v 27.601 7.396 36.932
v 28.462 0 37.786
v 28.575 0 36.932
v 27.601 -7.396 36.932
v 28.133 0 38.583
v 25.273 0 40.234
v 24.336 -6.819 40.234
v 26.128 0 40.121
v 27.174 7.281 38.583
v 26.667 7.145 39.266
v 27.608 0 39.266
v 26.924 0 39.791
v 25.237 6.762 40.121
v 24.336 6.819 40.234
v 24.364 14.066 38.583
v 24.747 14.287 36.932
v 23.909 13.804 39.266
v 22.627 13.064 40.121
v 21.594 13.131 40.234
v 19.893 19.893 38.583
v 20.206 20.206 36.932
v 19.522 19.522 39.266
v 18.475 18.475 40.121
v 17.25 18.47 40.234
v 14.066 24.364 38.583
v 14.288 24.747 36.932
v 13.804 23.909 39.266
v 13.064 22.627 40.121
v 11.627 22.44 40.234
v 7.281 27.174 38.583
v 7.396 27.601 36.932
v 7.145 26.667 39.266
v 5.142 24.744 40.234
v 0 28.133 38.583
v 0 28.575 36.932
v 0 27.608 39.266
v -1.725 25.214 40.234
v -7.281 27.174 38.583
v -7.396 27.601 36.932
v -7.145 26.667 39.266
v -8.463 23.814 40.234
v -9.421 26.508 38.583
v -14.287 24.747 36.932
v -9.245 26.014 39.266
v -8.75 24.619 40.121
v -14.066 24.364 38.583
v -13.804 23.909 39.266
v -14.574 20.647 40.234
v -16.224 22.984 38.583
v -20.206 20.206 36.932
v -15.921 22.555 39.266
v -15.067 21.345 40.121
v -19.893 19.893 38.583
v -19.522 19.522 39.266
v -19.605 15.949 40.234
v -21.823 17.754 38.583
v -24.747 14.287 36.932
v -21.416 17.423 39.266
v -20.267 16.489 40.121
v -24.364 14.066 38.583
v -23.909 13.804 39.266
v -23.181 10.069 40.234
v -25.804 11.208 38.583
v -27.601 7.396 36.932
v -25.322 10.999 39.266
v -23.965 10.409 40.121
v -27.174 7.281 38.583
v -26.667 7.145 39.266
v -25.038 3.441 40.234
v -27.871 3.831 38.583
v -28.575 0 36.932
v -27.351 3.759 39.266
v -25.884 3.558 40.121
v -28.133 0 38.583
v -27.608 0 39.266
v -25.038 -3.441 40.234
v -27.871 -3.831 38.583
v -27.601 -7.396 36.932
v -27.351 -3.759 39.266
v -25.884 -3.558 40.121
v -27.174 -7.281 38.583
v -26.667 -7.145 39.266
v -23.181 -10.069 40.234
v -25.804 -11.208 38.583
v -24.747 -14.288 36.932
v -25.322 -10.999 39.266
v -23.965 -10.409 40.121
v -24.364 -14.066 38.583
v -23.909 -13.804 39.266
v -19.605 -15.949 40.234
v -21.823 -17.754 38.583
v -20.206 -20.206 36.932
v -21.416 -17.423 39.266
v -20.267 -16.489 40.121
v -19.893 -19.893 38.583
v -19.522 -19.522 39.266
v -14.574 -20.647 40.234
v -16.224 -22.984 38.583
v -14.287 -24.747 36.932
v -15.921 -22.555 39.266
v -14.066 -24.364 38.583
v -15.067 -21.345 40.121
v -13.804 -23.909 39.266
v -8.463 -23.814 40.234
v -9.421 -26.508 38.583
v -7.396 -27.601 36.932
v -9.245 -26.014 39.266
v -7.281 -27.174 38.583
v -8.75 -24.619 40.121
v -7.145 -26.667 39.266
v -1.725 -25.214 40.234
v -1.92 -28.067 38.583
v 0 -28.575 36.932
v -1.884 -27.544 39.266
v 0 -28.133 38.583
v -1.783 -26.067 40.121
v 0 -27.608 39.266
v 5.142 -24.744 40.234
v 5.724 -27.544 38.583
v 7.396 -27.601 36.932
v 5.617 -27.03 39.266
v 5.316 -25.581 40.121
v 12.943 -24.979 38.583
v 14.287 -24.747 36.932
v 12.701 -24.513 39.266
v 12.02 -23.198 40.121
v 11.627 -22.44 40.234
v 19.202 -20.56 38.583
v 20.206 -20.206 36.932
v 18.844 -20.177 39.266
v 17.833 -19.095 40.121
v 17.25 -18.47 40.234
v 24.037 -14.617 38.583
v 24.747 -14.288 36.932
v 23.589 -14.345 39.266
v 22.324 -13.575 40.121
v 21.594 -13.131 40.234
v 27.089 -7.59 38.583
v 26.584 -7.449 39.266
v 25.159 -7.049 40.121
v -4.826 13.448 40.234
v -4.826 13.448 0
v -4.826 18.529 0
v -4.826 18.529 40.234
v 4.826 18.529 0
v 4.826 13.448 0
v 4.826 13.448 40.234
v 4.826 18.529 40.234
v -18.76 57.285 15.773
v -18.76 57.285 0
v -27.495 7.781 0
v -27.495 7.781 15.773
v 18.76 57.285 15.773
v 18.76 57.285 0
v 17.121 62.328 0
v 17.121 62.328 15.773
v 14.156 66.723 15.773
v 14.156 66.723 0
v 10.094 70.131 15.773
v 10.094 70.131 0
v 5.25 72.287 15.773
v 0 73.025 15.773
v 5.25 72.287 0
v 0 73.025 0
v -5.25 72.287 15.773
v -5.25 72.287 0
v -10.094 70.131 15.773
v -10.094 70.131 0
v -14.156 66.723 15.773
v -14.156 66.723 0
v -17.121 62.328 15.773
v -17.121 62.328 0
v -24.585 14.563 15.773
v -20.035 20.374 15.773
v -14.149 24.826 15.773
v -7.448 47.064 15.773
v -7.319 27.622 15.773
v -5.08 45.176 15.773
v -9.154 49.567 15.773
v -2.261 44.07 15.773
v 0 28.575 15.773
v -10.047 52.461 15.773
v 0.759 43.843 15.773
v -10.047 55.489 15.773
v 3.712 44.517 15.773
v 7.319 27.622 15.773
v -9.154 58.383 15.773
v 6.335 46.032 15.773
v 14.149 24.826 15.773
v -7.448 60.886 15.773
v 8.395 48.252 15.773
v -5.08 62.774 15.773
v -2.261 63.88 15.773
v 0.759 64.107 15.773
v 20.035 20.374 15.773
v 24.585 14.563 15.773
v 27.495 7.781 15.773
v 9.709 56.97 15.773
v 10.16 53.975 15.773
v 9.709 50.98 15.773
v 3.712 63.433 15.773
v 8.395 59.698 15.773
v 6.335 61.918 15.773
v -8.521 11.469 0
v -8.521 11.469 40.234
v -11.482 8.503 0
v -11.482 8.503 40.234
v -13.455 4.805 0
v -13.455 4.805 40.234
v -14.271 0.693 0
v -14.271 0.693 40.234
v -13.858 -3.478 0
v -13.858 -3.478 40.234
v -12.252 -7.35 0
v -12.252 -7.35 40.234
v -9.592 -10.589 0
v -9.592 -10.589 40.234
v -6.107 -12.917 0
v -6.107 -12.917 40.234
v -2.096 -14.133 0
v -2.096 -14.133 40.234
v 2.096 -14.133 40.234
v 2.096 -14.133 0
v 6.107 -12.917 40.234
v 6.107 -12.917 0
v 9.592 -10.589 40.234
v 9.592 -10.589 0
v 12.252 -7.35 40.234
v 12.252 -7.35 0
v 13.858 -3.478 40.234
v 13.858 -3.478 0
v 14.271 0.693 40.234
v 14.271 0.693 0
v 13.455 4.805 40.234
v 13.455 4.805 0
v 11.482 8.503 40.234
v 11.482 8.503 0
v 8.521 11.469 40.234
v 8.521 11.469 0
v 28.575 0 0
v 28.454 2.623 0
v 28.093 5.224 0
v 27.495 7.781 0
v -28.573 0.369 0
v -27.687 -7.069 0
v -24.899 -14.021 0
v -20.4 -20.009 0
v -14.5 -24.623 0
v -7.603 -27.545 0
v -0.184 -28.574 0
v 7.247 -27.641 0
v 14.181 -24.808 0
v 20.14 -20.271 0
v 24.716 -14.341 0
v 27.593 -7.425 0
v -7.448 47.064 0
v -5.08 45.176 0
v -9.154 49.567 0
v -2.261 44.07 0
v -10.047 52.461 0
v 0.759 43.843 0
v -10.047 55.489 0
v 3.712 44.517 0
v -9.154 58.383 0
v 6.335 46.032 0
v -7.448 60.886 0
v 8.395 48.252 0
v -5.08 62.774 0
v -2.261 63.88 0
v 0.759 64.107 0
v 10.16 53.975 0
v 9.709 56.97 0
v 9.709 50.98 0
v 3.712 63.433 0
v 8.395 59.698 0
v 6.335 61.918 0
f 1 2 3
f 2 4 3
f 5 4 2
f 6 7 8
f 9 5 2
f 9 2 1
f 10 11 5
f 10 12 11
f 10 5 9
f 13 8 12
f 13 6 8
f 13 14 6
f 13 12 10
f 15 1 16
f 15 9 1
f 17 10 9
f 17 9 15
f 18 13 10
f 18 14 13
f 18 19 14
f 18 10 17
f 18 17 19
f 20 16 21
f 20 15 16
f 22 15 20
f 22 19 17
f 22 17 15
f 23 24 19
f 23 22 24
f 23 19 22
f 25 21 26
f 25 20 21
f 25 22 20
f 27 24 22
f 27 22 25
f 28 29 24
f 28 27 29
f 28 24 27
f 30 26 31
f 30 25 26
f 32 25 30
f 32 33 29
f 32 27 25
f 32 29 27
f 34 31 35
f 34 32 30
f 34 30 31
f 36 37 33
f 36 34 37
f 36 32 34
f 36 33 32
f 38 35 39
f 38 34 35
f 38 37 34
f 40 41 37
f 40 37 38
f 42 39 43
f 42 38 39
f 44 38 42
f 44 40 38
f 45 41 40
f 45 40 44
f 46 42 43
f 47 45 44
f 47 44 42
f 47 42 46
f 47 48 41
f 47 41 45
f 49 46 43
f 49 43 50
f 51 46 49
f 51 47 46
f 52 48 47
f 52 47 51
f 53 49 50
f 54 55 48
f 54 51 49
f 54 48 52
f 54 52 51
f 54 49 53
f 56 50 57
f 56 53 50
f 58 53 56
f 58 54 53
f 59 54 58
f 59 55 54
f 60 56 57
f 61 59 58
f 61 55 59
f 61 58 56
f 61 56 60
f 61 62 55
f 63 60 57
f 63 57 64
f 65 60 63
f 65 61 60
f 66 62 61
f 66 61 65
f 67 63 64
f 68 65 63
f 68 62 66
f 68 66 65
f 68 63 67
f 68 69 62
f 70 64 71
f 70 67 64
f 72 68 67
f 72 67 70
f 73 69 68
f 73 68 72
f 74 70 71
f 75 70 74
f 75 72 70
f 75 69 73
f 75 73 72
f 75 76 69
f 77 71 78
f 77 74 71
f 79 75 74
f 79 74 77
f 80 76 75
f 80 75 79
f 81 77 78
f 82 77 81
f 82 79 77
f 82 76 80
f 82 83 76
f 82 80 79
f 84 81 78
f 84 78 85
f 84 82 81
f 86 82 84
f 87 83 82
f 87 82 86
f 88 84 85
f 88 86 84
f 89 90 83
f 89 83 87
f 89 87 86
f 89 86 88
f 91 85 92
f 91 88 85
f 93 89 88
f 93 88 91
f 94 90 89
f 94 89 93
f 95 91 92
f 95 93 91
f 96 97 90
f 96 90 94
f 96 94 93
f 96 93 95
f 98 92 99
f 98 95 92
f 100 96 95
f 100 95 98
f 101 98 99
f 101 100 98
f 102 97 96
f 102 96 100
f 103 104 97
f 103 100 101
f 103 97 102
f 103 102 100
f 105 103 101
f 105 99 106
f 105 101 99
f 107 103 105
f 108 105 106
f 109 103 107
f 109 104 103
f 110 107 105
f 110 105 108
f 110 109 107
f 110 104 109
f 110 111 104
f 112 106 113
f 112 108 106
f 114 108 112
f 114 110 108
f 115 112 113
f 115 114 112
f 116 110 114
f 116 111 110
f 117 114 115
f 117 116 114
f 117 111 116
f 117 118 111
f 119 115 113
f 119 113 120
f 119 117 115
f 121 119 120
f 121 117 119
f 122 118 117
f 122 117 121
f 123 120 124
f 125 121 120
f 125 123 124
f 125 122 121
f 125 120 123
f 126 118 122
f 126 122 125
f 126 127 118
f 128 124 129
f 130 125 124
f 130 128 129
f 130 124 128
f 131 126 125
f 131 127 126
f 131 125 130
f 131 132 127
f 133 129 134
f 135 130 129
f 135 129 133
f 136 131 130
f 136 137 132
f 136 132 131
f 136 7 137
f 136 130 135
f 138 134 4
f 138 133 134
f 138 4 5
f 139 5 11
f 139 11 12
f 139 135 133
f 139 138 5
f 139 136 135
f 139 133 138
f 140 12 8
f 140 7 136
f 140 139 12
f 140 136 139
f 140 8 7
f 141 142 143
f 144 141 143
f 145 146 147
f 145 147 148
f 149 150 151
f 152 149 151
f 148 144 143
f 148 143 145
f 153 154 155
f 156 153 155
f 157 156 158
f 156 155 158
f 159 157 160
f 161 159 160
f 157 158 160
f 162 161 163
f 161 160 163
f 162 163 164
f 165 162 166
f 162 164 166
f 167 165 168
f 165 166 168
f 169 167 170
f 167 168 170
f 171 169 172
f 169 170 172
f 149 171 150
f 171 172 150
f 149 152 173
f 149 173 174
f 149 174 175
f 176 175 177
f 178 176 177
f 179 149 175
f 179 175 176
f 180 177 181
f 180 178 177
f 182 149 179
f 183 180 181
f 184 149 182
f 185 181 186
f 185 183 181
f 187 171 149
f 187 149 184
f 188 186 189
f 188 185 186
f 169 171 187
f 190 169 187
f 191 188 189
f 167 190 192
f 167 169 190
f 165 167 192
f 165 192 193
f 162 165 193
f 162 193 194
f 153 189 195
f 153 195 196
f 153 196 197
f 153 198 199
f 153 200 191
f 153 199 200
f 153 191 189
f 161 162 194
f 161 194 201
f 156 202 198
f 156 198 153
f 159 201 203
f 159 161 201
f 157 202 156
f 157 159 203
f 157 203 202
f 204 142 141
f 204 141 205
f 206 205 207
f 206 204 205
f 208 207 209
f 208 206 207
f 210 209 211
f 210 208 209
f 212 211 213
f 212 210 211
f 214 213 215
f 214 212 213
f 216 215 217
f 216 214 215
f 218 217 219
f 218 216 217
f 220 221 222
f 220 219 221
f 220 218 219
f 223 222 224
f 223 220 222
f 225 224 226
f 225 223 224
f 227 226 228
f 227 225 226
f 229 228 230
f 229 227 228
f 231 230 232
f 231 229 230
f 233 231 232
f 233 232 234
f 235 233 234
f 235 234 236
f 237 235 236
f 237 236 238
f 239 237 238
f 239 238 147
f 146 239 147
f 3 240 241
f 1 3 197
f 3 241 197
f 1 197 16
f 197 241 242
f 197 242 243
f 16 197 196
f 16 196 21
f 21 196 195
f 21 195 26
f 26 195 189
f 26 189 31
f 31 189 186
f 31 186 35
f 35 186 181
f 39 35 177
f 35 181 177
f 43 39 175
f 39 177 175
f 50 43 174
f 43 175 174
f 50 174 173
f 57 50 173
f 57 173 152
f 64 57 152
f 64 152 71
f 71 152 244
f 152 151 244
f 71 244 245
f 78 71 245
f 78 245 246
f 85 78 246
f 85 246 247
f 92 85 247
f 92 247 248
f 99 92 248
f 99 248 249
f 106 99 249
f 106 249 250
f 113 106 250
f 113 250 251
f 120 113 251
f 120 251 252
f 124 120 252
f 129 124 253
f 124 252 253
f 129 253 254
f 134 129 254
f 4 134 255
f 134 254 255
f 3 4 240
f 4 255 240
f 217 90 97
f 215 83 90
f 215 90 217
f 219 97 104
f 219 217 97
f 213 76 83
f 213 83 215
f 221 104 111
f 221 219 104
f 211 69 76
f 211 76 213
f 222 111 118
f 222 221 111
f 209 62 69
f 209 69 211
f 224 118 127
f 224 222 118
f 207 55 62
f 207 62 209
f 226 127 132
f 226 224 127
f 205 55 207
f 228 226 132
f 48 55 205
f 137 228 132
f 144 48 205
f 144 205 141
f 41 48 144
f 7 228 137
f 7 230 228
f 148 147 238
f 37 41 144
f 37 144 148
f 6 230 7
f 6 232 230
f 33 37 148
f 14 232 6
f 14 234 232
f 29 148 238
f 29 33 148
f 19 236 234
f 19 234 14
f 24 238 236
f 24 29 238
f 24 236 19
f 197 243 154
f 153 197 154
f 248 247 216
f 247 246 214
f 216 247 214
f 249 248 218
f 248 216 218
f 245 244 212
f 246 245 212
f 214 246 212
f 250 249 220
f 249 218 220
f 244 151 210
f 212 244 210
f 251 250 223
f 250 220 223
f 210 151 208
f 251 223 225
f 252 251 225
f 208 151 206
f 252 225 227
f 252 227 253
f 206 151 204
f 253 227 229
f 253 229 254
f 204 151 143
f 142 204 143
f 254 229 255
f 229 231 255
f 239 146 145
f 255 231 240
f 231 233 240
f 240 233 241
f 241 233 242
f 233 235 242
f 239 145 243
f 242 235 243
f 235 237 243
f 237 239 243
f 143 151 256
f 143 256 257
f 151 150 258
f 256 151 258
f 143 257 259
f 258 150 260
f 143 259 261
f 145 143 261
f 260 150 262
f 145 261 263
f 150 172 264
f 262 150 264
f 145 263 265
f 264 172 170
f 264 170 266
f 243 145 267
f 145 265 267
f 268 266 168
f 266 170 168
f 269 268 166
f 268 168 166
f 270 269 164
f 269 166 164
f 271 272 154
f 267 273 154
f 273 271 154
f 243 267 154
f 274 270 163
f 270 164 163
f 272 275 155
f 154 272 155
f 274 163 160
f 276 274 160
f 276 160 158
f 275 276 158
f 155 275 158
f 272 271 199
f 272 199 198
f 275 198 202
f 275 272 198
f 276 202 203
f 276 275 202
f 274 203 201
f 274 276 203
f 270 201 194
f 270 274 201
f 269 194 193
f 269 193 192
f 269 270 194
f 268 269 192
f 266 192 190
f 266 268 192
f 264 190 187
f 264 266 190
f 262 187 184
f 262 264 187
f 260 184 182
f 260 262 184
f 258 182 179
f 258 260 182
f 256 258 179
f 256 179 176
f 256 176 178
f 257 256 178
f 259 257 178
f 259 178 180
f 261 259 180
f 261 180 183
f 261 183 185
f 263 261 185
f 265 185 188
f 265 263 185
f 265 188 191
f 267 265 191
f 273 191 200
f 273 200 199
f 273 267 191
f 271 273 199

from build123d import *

# Parameters (mm, degrees)
F0_R     = 28.575
F0_R_2   = 14.2875
F1_DEPTH = 40.2336
F2_W     = 9.652
F2_H     = 5.081535
F3_DEPTH = 40.2346
F4_R     = 10.16
F5_DEPTH = 15.7734
F6_R     = 3.302


with BuildPart() as f1:
    # F0 (on Top) → F1 (new body)
    with BuildSketch(Plane.XY):
        Circle(F0_R)
        Circle(F0_R_2, mode=Mode.SUBTRACT)
    extrude(amount=F1_DEPTH)

    # F2 (on face) → F3 (cut, through all)
    with BuildSketch(Plane.XY.offset(40.2336)):
        with Locations((0, 15.988532)):
            Rectangle(F2_W, F2_H)
    extrude(amount=-F3_DEPTH, mode=Mode.SUBTRACT)

    # F4 (on Top) → F5 (join)
    with BuildSketch(Plane.XY):
        with BuildLine():
            ThreePointArc((18.760191, 57.285248), (0, 73.025), (-18.760191, 57.285248))
            Line((-18.760191, 57.285248), (-27.641075, 6.954561))
            ThreePointArc((-27.641075, 6.954561), (0, 28.502543), (27.641075, 6.954561))
            Line((27.641075, 6.954561), (18.760191, 57.285248))
        make_face()
        with Locations((0, 53.975)):
            Circle(F4_R, mode=Mode.SUBTRACT)
    extrude(amount=F5_DEPTH)

    # F6
    f6_edges = [f1.edges().sort_by_distance(p)[0] for p in [
        (-28.575, 0, 40.2336),
    ]]
    fillet(f6_edges, radius=F6_R)


solid = f1.part
